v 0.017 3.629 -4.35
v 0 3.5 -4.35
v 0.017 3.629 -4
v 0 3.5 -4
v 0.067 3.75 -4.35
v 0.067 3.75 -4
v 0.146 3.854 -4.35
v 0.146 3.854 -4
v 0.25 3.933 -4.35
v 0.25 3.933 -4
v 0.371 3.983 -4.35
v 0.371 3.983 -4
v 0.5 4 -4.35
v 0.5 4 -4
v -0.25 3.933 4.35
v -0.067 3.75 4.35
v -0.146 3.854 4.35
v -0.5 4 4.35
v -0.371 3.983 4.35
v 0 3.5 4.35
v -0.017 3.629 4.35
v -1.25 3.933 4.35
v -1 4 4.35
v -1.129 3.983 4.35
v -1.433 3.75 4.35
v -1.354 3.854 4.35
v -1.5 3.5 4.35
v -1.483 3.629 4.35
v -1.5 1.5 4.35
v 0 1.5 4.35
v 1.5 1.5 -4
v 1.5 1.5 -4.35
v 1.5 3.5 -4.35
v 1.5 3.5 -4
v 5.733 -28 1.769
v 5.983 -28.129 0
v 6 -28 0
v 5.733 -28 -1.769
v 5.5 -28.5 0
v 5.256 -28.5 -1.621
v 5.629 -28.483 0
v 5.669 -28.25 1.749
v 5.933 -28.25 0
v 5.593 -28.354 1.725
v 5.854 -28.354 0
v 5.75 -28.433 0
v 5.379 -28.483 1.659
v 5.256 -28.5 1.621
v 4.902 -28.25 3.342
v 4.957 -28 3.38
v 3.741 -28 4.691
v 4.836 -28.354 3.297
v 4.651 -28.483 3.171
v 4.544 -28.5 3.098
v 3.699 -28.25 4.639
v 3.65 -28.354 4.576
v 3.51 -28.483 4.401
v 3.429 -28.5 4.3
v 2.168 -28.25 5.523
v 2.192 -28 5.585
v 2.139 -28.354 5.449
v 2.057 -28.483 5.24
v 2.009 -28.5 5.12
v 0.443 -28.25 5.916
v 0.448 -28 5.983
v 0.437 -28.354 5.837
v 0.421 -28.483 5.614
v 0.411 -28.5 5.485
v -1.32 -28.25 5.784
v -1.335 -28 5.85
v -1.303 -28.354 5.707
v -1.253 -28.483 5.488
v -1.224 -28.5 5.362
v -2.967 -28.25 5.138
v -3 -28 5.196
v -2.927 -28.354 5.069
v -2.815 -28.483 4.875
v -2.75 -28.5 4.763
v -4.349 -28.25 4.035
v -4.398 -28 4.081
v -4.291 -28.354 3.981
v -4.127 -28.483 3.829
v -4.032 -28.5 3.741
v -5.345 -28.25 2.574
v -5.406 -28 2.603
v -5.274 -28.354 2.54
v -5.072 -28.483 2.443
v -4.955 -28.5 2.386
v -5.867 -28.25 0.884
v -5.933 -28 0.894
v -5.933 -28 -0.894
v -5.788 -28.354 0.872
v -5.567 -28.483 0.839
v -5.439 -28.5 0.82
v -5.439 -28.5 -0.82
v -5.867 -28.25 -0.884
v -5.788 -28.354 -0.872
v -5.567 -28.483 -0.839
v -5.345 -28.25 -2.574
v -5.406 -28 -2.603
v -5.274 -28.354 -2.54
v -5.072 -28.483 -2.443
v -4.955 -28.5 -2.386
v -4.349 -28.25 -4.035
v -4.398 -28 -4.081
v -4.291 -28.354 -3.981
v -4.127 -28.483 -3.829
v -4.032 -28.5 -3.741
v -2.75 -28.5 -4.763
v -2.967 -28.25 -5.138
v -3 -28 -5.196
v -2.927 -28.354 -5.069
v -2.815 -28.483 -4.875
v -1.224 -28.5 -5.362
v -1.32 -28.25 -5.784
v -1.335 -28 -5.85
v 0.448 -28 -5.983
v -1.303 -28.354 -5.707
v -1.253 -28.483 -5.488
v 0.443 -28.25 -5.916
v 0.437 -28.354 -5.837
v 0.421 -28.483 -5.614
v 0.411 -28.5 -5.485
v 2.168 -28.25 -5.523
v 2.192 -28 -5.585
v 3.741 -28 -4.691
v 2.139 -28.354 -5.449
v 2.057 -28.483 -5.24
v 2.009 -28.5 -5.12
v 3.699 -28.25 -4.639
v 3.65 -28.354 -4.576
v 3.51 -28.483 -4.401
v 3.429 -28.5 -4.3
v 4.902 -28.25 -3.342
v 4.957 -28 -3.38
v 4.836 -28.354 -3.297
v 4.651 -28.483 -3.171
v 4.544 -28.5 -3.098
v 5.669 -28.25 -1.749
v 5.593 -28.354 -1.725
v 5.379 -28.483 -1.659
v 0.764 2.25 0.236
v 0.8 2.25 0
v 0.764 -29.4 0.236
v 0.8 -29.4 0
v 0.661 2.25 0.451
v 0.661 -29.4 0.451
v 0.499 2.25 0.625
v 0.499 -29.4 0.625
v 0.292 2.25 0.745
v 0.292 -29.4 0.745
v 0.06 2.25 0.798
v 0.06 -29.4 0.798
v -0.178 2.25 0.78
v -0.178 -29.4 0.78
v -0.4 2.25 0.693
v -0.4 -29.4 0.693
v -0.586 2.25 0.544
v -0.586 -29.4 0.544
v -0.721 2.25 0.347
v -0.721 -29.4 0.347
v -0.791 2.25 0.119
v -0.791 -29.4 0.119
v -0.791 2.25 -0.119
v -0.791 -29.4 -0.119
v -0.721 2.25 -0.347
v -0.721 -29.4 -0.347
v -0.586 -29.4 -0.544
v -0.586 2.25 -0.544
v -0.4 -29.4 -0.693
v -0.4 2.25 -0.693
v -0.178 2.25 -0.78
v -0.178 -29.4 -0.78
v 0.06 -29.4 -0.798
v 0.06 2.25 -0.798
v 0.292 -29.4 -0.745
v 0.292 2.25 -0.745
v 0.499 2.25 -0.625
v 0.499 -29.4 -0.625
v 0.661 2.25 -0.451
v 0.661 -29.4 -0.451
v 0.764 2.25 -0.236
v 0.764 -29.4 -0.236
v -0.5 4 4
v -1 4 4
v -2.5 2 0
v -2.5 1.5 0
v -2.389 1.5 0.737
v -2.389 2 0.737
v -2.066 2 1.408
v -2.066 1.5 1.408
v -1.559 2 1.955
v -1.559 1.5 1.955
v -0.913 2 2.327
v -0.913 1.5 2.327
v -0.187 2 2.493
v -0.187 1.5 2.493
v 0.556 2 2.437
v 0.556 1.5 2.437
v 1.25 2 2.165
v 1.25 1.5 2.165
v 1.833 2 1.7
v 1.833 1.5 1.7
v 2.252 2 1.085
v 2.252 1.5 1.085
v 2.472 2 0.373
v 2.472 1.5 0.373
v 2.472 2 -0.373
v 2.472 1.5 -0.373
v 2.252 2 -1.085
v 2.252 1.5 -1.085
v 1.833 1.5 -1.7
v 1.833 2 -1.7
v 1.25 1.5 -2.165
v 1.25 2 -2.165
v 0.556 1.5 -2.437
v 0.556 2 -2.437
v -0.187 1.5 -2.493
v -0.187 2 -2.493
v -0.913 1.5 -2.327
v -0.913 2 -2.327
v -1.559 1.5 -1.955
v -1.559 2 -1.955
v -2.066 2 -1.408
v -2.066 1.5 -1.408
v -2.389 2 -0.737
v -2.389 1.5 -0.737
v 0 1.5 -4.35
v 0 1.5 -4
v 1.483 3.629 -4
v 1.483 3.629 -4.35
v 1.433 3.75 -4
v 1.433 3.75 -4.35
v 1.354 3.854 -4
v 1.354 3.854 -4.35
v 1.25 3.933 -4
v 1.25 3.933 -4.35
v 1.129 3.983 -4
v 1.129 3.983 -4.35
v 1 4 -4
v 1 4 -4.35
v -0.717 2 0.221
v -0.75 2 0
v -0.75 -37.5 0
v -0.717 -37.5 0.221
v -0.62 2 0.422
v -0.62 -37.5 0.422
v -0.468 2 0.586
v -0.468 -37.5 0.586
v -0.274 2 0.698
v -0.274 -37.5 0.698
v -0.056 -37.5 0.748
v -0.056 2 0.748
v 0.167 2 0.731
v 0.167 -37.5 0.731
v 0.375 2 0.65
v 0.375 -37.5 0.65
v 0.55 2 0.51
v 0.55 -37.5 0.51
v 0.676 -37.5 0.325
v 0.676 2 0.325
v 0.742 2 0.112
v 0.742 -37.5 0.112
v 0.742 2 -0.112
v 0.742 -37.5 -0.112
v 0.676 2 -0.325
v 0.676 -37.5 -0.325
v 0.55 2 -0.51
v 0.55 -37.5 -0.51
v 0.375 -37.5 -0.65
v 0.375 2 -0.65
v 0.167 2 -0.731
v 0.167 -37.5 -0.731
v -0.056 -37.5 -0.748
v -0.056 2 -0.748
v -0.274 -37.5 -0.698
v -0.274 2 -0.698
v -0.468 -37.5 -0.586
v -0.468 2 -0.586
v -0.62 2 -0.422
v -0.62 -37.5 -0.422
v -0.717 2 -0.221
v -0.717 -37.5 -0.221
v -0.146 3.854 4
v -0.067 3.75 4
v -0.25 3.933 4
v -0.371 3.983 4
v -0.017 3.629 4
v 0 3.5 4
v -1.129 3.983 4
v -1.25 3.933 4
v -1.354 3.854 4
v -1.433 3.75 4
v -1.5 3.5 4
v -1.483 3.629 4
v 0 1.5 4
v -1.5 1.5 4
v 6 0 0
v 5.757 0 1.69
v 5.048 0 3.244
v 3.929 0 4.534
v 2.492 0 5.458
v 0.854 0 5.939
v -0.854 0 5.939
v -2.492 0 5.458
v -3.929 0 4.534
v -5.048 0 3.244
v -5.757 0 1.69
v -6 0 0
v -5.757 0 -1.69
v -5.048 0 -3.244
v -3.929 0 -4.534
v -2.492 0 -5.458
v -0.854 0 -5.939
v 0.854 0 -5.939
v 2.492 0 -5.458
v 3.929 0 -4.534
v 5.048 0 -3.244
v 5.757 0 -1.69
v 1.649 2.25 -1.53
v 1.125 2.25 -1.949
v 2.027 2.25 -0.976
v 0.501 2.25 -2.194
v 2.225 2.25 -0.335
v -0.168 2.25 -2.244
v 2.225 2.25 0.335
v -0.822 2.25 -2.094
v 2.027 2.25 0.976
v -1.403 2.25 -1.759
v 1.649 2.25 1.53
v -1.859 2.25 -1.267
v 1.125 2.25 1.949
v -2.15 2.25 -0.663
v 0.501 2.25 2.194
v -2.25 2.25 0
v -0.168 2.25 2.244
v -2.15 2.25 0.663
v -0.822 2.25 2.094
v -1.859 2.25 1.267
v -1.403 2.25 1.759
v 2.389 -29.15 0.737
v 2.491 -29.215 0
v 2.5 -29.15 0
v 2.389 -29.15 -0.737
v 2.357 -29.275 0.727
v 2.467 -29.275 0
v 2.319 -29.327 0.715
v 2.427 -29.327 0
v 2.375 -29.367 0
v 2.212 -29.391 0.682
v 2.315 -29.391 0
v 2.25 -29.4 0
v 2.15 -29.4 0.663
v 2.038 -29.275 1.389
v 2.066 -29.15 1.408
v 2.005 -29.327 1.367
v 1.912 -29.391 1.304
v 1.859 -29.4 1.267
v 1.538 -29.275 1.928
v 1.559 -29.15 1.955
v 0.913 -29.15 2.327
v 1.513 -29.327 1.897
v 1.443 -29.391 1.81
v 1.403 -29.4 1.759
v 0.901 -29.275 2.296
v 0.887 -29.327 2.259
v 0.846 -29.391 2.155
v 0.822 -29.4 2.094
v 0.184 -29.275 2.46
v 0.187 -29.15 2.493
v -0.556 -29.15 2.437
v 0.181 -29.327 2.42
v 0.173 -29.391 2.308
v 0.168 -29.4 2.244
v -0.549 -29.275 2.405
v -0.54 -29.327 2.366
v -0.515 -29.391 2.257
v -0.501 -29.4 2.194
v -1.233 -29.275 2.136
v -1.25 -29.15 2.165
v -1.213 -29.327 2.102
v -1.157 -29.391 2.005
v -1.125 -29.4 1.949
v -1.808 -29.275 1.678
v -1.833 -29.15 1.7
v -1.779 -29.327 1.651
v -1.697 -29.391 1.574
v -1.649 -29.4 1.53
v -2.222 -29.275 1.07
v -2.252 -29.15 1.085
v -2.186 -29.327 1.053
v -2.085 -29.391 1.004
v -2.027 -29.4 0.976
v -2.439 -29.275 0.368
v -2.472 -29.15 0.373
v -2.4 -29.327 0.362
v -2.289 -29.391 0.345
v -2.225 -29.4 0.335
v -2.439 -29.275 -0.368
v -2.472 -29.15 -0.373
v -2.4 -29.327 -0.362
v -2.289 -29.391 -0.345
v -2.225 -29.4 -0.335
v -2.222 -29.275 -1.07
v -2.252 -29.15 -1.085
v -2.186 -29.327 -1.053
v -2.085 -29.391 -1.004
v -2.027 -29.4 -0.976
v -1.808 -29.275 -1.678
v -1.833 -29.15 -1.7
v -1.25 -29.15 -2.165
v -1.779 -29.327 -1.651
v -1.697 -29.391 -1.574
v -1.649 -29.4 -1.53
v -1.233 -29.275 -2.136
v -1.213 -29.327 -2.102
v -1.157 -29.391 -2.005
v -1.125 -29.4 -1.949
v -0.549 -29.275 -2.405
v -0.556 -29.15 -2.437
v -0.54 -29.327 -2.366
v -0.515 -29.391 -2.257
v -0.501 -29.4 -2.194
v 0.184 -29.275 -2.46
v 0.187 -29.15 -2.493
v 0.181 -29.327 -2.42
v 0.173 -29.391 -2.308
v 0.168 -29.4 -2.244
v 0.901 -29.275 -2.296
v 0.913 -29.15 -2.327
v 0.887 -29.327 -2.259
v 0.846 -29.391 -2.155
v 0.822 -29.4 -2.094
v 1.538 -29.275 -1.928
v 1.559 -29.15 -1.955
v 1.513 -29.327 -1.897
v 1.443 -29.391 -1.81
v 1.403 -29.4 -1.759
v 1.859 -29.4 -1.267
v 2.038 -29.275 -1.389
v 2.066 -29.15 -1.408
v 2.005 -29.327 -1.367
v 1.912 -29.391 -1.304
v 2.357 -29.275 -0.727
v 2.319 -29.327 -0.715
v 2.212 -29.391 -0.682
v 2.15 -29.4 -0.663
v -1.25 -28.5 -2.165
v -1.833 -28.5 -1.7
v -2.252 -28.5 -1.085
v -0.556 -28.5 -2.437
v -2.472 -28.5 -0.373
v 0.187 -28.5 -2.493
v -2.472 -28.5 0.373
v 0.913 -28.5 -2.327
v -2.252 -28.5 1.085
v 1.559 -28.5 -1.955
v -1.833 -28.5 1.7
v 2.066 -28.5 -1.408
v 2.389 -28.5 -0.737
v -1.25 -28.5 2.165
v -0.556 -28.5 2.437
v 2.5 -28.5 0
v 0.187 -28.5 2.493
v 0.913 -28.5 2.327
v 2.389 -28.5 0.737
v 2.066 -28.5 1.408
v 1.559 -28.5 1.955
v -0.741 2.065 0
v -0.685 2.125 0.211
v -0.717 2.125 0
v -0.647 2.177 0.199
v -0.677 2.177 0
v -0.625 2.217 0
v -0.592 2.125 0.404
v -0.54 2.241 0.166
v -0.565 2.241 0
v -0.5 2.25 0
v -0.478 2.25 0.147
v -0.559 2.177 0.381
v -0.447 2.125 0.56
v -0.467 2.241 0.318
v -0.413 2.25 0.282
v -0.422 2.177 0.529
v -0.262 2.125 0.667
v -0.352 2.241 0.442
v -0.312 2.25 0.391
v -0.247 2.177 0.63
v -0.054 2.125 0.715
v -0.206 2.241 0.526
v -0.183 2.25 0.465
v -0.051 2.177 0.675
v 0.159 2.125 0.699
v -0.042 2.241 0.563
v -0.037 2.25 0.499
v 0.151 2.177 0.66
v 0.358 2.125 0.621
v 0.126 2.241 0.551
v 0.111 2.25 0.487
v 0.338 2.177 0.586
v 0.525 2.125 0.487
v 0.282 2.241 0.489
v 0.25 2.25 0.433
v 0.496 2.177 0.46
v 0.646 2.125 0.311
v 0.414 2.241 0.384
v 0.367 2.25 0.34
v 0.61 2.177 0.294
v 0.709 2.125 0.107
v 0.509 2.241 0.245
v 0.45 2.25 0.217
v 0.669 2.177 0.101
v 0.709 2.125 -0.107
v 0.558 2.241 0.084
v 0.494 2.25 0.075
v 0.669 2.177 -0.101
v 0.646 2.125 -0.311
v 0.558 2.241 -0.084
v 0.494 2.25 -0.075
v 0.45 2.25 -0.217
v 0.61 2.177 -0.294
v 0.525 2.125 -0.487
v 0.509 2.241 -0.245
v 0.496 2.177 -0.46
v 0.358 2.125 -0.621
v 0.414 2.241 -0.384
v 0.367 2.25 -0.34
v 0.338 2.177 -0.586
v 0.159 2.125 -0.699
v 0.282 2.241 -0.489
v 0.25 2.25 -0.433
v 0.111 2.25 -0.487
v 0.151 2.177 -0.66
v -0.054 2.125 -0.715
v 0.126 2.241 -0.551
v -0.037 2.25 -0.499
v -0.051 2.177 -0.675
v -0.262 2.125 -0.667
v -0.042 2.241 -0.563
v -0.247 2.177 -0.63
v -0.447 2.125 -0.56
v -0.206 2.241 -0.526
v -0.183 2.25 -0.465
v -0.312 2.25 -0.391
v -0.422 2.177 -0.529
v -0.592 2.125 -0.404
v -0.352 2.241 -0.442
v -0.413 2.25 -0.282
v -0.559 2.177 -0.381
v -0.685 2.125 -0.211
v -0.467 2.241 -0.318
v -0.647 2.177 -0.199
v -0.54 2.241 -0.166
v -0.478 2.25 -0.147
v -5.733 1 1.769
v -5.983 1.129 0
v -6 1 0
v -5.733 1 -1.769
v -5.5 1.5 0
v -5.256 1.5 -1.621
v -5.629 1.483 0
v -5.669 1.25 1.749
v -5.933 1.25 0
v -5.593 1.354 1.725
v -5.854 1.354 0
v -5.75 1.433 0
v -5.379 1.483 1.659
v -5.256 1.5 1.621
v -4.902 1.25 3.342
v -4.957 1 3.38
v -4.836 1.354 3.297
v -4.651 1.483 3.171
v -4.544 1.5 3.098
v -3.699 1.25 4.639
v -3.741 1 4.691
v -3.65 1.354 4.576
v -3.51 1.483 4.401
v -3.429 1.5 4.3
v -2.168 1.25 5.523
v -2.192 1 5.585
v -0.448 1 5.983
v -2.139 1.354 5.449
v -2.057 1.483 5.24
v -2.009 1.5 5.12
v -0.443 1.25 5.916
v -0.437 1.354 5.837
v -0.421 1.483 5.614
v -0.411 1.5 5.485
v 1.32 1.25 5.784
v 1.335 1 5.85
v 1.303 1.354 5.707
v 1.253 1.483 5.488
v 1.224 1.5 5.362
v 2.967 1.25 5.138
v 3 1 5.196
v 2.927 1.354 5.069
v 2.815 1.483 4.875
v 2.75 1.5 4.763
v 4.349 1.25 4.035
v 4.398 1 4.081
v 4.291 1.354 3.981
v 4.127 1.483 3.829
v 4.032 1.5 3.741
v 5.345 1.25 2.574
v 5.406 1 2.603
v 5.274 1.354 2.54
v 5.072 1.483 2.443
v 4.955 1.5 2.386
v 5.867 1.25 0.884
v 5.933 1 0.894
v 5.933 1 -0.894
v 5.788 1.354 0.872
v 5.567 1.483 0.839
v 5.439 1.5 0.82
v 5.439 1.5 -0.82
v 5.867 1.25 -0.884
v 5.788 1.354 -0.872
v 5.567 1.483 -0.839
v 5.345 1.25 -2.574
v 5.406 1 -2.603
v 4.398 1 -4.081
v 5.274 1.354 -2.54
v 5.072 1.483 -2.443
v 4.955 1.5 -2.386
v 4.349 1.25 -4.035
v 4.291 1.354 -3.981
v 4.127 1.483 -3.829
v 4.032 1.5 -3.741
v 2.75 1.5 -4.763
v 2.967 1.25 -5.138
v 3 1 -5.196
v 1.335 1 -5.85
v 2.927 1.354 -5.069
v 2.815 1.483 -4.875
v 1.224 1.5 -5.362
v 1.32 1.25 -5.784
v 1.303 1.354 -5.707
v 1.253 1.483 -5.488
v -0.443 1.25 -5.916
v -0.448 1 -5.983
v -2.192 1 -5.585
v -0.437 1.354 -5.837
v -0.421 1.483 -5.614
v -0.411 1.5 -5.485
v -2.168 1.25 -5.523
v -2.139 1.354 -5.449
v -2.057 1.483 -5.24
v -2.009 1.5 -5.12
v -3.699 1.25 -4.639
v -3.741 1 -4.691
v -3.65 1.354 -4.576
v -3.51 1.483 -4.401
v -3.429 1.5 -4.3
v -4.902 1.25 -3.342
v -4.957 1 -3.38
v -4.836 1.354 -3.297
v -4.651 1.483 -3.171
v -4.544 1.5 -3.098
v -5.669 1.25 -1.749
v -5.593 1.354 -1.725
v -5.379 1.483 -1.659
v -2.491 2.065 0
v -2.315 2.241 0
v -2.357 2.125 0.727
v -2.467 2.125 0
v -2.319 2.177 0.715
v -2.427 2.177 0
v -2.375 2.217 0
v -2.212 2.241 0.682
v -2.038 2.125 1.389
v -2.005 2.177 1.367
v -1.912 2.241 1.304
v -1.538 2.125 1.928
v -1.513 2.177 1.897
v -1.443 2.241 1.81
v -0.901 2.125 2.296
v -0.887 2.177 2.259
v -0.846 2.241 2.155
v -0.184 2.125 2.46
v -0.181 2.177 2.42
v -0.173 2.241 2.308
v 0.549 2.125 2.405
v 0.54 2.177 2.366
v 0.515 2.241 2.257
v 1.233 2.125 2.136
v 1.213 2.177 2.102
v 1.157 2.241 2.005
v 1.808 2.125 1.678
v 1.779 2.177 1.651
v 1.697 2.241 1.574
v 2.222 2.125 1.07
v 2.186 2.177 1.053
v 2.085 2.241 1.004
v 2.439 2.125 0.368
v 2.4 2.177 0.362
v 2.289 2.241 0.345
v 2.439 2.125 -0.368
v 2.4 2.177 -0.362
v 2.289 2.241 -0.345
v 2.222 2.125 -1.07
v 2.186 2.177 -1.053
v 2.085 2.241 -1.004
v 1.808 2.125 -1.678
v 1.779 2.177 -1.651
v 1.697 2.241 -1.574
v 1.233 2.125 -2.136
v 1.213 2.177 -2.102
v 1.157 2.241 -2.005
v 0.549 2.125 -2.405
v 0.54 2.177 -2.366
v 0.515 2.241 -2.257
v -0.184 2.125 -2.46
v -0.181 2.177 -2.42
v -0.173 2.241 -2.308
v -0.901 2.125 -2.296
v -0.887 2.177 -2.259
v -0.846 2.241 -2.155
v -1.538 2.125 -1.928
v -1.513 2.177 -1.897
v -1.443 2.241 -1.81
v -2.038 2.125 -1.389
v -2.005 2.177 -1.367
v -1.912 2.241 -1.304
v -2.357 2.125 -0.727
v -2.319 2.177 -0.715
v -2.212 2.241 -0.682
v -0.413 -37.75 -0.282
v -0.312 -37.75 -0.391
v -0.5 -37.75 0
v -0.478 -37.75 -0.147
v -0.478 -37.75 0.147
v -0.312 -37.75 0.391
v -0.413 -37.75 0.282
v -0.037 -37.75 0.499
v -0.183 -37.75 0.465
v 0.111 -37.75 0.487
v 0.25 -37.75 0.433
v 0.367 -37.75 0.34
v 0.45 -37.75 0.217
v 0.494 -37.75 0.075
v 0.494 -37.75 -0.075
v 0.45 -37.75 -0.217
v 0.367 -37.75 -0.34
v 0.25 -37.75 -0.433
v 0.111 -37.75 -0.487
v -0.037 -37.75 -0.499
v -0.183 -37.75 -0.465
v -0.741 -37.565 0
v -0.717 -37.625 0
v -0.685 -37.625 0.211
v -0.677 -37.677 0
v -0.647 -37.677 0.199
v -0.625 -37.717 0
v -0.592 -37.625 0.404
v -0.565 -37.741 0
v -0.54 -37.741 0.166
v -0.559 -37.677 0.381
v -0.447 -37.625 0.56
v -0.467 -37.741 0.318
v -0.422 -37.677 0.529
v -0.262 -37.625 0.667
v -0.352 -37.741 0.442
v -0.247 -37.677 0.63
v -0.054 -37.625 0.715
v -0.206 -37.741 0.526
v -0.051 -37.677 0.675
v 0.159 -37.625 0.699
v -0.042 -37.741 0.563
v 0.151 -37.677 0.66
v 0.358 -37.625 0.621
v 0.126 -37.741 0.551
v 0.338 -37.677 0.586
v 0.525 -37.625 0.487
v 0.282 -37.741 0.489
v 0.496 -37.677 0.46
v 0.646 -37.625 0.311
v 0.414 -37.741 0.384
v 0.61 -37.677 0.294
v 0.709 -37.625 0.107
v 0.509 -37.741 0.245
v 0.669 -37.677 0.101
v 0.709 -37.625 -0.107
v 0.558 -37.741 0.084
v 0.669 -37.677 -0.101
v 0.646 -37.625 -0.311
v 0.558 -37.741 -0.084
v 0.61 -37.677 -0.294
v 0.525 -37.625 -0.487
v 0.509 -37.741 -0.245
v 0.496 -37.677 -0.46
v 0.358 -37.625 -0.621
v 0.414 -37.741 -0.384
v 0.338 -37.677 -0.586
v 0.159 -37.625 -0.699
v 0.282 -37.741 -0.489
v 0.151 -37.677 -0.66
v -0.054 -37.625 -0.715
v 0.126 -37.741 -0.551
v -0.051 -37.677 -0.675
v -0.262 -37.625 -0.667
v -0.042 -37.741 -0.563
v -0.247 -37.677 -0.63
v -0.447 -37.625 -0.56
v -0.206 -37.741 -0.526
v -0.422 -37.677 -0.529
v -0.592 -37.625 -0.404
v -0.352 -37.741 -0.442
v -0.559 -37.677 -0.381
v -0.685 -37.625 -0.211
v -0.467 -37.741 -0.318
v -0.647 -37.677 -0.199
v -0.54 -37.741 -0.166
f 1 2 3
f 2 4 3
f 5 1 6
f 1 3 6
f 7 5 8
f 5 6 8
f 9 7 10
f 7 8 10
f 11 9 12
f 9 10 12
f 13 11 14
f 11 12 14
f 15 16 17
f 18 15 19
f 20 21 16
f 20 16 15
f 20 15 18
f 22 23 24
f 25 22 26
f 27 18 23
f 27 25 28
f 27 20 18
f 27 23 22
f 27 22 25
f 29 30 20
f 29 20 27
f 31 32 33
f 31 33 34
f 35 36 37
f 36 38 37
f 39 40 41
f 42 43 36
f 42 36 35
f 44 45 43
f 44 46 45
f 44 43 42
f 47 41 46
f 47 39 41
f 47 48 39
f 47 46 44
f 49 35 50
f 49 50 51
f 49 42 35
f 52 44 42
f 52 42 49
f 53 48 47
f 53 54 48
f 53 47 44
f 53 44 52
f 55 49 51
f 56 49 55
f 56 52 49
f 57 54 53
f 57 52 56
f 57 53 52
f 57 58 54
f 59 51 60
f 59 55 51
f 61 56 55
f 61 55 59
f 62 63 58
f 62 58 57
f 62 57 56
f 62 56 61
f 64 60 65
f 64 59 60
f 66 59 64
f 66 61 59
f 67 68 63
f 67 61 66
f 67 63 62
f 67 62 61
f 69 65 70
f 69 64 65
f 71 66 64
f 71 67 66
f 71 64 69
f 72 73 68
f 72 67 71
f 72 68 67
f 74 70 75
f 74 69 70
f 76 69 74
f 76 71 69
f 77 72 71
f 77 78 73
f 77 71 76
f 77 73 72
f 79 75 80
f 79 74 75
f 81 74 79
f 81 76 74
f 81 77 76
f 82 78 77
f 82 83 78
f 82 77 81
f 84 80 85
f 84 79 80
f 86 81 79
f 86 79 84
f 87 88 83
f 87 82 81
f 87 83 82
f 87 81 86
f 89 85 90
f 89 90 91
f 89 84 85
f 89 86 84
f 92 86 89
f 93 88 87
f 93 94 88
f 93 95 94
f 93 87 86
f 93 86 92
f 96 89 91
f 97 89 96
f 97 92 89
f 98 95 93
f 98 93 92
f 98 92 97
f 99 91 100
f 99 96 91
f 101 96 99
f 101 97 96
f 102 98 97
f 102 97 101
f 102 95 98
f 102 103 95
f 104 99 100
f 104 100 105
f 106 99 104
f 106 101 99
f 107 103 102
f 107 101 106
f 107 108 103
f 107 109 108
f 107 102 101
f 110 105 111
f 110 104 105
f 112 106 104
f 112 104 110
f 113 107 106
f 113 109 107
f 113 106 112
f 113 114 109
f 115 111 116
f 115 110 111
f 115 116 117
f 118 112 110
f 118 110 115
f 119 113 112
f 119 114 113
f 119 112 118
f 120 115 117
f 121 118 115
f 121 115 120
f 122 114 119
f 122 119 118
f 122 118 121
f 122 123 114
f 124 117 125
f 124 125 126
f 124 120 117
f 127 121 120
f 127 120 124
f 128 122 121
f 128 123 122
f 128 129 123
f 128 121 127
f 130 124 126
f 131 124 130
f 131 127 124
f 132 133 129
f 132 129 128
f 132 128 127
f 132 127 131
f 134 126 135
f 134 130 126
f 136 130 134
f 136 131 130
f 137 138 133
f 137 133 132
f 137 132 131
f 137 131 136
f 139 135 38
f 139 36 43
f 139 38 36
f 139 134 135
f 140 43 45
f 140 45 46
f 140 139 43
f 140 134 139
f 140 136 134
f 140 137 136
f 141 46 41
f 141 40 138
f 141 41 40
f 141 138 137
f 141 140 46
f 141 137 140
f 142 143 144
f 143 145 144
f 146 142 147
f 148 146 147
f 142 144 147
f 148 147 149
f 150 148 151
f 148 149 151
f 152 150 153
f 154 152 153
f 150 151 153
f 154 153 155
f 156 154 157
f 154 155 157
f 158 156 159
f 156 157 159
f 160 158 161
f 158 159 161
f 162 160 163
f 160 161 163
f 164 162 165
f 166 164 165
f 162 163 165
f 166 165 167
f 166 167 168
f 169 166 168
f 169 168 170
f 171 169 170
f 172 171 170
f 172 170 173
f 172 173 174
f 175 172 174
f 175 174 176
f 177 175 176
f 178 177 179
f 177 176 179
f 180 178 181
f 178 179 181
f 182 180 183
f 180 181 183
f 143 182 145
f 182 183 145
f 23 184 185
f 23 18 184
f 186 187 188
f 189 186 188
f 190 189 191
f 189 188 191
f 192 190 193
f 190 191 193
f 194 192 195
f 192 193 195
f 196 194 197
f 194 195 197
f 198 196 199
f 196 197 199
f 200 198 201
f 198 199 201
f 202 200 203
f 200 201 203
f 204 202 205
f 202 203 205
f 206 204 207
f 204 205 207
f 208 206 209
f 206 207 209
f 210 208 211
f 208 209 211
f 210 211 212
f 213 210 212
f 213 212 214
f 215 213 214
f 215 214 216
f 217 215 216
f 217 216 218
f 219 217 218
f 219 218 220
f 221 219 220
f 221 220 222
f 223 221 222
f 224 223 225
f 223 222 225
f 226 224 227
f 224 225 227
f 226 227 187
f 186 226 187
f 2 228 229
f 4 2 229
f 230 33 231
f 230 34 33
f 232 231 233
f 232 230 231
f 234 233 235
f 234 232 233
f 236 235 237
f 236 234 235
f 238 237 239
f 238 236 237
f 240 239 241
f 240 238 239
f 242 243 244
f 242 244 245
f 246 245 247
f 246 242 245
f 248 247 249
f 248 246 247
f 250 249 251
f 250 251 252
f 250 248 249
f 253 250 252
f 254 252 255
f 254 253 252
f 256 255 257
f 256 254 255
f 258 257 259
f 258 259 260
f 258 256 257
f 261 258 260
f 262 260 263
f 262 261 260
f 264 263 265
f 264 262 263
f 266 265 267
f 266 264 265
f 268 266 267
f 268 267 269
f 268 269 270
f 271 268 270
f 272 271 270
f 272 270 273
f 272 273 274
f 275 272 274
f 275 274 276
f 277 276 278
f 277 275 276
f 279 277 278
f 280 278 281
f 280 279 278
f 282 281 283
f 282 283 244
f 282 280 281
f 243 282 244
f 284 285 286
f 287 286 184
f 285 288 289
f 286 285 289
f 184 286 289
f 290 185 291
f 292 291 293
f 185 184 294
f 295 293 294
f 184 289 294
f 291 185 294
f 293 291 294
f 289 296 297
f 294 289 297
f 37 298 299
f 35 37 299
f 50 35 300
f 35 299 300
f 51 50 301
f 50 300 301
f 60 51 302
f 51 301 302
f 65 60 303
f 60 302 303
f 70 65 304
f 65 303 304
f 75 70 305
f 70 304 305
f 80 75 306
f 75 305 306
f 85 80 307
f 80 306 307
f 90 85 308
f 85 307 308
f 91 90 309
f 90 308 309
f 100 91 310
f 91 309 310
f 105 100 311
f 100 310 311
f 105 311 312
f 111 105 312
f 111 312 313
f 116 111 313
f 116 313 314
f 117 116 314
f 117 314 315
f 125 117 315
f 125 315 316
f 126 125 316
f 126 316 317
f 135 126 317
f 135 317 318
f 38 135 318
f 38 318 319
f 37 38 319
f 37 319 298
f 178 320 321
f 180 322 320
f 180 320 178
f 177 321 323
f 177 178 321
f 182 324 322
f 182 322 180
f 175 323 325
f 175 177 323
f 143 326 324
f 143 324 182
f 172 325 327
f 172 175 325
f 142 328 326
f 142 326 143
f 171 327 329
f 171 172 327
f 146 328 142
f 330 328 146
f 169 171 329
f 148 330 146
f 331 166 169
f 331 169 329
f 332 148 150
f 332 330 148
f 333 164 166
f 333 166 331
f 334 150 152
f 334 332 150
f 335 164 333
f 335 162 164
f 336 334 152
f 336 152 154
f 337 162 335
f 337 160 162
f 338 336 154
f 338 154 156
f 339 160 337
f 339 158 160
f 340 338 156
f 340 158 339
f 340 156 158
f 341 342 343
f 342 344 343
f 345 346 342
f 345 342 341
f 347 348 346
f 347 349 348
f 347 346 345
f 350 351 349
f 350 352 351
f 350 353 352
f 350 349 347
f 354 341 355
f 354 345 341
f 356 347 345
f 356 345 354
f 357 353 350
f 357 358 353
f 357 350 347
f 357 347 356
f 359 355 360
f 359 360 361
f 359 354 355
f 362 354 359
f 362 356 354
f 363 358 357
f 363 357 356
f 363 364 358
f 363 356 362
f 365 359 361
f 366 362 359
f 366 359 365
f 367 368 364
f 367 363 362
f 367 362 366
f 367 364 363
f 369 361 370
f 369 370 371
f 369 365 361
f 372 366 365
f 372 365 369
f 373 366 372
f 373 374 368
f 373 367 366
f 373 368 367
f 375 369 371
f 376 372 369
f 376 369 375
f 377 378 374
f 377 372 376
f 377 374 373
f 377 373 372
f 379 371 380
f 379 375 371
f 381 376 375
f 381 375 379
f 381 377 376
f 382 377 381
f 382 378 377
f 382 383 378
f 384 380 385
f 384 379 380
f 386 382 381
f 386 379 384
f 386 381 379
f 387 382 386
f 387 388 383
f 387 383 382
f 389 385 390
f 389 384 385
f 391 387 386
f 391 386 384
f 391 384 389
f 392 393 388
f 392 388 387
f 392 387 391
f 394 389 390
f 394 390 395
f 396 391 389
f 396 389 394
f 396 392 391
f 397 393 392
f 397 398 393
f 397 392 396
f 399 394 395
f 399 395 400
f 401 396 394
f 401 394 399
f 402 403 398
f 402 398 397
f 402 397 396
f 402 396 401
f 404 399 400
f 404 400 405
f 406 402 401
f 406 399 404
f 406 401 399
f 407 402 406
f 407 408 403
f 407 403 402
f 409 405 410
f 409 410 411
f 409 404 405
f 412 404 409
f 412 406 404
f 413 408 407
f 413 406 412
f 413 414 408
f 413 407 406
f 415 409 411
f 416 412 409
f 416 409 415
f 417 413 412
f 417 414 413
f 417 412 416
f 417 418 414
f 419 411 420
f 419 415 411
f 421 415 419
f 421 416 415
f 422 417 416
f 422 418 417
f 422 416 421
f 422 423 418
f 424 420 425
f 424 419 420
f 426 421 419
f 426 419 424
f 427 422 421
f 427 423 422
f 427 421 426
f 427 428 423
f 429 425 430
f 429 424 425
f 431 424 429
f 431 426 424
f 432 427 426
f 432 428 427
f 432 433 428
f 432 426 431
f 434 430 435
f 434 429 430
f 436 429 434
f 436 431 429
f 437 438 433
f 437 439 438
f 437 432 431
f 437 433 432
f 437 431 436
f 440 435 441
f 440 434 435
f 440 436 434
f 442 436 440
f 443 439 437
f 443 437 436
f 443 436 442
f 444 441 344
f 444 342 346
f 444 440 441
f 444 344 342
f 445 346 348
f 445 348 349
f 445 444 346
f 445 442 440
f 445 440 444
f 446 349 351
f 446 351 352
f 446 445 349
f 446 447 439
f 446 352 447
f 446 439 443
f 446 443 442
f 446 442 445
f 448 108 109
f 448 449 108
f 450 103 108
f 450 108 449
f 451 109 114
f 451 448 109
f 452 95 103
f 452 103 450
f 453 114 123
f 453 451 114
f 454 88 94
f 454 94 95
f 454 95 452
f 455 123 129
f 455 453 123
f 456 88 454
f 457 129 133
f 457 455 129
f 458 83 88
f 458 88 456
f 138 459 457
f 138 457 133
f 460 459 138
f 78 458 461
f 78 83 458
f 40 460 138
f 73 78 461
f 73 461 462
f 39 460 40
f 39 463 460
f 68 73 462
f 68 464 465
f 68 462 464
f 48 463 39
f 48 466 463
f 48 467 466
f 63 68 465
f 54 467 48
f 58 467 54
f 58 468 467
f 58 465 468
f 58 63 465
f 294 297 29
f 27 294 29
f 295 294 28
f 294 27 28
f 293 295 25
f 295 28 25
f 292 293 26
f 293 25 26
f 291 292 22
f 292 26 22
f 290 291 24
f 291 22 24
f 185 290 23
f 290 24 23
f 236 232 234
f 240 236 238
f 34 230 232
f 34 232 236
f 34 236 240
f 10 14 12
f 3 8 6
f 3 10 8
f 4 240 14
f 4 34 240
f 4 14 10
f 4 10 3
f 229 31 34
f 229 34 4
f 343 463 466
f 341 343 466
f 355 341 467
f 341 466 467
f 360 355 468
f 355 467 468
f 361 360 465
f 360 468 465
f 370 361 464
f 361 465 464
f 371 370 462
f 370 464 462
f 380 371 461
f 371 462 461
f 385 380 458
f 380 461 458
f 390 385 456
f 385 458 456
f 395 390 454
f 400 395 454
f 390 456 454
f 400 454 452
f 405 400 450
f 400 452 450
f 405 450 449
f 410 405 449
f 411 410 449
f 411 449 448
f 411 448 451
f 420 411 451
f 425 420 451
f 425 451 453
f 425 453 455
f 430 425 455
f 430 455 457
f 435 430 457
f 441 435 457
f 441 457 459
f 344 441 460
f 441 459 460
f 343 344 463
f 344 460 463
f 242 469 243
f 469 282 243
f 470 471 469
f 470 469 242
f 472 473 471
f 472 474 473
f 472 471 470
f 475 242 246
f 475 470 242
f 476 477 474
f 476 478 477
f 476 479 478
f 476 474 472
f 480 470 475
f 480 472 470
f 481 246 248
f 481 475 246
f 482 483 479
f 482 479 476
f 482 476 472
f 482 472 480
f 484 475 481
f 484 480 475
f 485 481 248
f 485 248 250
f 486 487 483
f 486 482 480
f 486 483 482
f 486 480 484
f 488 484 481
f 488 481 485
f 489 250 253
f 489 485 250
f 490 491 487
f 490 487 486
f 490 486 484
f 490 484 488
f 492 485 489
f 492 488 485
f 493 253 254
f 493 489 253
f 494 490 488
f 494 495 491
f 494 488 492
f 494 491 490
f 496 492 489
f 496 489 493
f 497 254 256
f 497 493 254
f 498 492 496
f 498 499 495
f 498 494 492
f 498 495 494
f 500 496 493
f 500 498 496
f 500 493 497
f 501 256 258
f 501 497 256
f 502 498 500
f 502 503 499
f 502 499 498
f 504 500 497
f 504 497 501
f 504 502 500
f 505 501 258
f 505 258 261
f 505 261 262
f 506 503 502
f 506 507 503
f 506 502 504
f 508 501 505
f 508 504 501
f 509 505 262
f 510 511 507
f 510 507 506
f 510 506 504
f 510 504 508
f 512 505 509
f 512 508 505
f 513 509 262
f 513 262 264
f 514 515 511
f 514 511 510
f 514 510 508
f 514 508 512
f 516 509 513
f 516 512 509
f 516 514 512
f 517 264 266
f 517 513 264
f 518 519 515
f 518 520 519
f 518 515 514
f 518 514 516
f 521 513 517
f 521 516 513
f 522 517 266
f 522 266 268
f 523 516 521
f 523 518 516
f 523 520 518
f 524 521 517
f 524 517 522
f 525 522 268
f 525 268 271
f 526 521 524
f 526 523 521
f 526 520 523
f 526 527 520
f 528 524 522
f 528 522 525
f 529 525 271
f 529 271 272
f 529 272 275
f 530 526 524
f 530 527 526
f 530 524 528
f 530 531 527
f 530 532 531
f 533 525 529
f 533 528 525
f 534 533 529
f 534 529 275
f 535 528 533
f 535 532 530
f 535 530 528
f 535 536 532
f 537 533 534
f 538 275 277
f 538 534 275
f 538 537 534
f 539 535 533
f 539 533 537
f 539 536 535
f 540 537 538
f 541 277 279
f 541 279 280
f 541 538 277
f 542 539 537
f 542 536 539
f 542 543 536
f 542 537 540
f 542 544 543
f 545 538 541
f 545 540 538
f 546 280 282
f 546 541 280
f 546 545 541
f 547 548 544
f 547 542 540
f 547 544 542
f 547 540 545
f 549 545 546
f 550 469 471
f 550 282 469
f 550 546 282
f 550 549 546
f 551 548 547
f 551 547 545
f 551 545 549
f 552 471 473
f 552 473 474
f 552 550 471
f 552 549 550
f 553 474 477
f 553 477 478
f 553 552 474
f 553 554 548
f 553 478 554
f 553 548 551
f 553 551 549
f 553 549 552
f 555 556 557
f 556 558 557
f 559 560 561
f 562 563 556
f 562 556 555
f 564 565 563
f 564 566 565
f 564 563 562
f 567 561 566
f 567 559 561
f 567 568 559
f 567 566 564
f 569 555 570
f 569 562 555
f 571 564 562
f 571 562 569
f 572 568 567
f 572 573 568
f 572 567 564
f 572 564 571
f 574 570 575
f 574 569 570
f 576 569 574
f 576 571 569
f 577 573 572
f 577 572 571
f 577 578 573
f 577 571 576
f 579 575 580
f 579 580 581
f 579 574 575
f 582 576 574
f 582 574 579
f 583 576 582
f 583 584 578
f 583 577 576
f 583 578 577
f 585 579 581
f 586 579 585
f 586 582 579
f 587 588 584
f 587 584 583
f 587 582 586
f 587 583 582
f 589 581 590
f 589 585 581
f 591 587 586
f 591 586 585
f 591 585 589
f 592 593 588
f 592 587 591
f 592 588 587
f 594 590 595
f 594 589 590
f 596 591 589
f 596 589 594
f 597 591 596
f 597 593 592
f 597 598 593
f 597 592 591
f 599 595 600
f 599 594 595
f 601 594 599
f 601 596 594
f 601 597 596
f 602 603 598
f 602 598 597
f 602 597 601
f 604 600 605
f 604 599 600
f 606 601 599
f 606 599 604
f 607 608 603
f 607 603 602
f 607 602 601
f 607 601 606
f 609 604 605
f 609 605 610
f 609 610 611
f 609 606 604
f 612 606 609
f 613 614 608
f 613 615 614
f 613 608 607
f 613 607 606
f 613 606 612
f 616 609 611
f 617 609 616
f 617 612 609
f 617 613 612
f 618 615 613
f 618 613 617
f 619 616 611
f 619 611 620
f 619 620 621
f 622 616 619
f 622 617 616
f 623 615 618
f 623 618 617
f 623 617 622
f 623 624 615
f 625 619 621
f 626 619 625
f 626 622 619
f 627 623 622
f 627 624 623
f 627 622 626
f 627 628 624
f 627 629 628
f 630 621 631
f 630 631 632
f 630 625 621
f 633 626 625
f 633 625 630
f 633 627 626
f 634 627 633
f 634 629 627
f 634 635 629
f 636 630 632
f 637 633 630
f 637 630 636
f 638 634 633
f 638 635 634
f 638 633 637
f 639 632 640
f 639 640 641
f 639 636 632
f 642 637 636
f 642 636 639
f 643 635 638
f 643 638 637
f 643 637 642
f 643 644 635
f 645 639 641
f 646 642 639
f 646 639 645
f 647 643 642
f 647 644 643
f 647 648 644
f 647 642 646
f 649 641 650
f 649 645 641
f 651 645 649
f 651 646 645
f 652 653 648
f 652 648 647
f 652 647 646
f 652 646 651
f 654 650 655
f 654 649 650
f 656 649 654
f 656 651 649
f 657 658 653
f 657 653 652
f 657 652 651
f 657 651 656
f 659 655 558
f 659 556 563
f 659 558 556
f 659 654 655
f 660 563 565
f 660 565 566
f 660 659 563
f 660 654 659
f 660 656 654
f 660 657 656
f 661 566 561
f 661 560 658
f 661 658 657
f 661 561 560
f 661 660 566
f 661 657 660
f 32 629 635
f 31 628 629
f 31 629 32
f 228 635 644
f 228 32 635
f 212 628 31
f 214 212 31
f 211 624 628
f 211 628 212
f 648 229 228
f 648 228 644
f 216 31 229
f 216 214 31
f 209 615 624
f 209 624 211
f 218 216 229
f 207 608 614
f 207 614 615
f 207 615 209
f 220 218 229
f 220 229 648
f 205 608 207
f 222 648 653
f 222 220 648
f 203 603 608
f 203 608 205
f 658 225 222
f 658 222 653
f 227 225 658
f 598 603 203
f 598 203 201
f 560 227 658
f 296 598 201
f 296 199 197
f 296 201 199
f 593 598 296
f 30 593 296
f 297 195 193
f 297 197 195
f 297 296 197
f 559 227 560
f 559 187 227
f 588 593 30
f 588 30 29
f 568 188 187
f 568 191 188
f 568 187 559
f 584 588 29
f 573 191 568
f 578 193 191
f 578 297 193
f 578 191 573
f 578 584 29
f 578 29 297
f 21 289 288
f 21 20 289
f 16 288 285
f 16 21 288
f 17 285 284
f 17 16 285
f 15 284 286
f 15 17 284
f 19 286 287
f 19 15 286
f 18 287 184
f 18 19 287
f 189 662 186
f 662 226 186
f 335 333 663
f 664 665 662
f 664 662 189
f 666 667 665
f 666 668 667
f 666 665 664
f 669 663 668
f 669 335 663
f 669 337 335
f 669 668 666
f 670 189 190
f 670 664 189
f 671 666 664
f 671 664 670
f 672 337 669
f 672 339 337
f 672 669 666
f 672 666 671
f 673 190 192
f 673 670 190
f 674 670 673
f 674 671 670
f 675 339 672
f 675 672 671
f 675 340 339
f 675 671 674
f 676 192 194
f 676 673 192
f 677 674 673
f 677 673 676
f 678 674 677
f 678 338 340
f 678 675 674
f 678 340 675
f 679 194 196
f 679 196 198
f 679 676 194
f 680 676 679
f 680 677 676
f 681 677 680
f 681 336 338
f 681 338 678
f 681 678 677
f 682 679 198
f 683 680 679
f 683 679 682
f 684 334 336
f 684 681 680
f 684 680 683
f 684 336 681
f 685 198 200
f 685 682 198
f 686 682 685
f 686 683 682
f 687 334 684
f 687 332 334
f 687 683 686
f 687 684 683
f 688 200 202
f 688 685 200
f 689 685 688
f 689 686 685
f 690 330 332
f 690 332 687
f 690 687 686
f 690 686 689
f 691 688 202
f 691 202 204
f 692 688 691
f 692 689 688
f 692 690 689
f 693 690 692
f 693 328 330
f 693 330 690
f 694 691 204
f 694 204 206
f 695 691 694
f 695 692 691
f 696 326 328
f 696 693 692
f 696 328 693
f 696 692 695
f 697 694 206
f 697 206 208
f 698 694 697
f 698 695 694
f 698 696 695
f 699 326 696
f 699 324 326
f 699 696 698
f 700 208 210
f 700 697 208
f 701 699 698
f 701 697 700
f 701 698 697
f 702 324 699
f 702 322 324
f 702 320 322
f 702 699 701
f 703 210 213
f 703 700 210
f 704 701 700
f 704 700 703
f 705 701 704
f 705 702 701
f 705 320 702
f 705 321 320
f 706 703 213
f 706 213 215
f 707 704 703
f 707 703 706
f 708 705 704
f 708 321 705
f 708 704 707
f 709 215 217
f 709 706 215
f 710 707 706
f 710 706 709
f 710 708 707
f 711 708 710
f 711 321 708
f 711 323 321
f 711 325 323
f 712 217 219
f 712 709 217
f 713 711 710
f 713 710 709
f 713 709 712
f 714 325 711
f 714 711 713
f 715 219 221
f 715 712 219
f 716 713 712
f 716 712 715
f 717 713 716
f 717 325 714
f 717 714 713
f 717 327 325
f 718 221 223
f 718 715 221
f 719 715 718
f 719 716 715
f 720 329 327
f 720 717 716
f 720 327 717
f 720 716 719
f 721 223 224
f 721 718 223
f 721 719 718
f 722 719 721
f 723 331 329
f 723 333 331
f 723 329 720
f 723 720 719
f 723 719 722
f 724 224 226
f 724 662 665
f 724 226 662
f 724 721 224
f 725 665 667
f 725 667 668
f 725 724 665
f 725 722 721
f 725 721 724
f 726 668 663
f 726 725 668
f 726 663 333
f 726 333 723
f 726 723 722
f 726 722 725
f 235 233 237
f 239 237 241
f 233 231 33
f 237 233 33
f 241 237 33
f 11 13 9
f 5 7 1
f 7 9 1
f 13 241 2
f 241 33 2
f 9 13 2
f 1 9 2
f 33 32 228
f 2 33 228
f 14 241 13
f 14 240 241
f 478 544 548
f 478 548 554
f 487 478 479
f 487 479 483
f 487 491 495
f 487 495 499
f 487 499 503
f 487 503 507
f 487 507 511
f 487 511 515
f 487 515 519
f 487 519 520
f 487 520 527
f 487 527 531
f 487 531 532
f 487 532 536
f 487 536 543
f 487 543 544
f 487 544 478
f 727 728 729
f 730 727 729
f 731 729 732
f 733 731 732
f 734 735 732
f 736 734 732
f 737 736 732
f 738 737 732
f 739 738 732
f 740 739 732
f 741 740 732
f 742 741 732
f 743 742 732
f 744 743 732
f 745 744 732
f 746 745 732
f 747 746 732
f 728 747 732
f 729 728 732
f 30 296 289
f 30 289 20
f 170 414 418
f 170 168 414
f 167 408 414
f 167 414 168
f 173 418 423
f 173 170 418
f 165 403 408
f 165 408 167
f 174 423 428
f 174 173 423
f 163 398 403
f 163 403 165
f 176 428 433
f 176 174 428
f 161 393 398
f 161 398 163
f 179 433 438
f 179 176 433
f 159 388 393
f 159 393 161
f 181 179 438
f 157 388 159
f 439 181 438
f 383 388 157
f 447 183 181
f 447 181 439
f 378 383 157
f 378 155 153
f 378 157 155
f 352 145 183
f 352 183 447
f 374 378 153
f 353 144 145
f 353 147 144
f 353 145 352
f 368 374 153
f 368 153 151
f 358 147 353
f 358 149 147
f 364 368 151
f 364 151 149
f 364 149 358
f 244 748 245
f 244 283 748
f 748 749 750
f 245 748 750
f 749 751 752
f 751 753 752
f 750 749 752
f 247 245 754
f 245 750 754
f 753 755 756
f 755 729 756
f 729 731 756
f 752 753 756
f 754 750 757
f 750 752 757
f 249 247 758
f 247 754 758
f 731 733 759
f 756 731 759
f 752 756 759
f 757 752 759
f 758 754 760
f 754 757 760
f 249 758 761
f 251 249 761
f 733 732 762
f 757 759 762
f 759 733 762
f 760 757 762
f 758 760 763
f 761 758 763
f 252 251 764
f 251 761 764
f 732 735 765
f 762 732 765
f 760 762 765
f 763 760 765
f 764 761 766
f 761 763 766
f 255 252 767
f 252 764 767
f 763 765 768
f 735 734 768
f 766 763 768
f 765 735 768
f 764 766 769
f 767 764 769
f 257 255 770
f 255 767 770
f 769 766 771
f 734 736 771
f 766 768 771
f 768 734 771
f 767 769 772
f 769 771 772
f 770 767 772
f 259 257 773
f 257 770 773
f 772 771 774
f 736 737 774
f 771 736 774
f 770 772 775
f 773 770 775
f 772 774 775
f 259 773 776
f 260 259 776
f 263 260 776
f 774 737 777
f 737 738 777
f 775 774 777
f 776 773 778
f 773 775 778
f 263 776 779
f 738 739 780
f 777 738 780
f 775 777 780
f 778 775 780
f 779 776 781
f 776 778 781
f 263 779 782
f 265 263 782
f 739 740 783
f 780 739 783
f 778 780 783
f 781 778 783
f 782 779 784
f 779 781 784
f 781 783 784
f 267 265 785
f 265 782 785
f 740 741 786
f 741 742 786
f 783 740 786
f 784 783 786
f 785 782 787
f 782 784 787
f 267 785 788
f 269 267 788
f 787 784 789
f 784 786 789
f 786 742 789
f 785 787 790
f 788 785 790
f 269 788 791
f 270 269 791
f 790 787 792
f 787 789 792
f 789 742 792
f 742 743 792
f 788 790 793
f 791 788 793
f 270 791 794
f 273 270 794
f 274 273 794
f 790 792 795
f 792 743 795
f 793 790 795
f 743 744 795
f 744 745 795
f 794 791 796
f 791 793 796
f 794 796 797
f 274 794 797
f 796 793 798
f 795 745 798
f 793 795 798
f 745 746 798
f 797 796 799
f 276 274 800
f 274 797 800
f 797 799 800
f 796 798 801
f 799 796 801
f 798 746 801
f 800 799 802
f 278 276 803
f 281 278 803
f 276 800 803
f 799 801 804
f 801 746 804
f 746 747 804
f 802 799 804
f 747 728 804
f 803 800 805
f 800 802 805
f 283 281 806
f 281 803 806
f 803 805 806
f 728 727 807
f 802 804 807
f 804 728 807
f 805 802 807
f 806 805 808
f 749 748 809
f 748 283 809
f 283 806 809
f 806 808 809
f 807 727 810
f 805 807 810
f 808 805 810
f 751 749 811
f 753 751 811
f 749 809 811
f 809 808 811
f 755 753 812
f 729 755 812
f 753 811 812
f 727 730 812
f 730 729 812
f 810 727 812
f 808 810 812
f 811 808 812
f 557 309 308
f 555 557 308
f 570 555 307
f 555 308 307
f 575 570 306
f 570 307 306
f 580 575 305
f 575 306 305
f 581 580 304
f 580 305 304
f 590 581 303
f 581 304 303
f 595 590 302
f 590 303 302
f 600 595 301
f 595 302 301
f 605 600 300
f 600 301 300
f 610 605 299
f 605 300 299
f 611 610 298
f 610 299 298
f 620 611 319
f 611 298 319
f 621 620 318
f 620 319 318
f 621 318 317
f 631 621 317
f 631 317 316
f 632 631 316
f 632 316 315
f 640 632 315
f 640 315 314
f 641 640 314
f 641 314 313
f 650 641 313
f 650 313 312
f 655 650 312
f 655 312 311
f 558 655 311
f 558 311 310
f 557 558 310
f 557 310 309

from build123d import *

# Parameters (mm, degrees)
F0_R      = 6
F1_DEPTH  = 28.5
F2_R      = 2.5
F3_DEPTH  = 0.9
F4_R      = 6
F4_R_2    = 2.5
F5_DEPTH  = 1.5
F6_R      = 2.5
F7_DEPTH  = 0.75
F8_R      = 0.8
F9_DEPTH  = 30
F10_R     = 0.75
F11_DEPTH = 40
F12_W     = 1.5
F12_H     = 0.35
F13_DEPTH = 2.5
F14_R     = 0.5
F15_R     = 0.25
F15_2_R   = 0.25


with BuildPart() as f1:
    # F0 (on Front) → F1 (new body)
    with BuildSketch(Plane.XZ):
        Circle(F0_R)
    extrude(amount=F1_DEPTH)

    # F2 (on face) → F3 (join)
    with BuildSketch(Plane.XZ.offset(28.5)):
        Circle(F2_R)
    extrude(amount=F3_DEPTH)

    # F4 (on face) → F5 (join)
    with BuildSketch(Plane(origin=(0, 0, 0), x_dir=(-1, 0, 0), z_dir=(0, 1, 0))):
        Circle(F4_R)
        Circle(F4_R_2, mode=Mode.SUBTRACT)
        Circle(F4_R_2)
    extrude(amount=F5_DEPTH)

    # F6 (on face) → F7 (join)
    with BuildSketch(Plane(origin=(0, 1.5, 0), x_dir=(-1, 0, 0), z_dir=(0, 1, 0))):
        Circle(F6_R)
    extrude(amount=F7_DEPTH)

    # F8 (on Front) → F9 (cut, symmetric)
    with BuildSketch(Plane.XZ):
        Circle(F8_R)
    extrude(amount=F9_DEPTH, both=True, mode=Mode.SUBTRACT)

    # F12 (on face) → F13 (join)
    with BuildSketch(Plane(origin=(0, 1.5, 0), x_dir=(-1, 0, 0), z_dir=(0, 1, 0))):
        with Locations((-0.75, -4.175)):
            Rectangle(F12_W, F12_H)
        with Locations((0.75, 4.175)):
            Rectangle(F12_W, F12_H)
    extrude(amount=F13_DEPTH)

    # F14
    f14_edges = [f1.edges().sort_by_distance(p)[0] for p in [
        (6, 1.5, 0),
        (-1.5, 4, 4.175),
        (0, 4, 4.175),
        (0, 4, -4.175),
        (1.5, 4, -4.175),
        (-6, -28.5, 0),
    ]]
    fillet(f14_edges, radius=F14_R)

    # F15
    f15_edges = [f1.edges().sort_by_distance(p)[0] for p in [
        (-2.5, -29.4, 0),
        (2.5, 2.25, 0),
    ]]
    fillet(f15_edges, radius=F15_R)


with BuildPart() as f11:
    # F10 (on face) → F11 (new body)
    with BuildSketch(Plane(origin=(0, 2.25, 0), x_dir=(-1, 0, 0), z_dir=(0, 1, 0))):
        Circle(F10_R)
    extrude(amount=-F11_DEPTH)

    # F15#2
    f15_2_edges = [f11.edges().sort_by_distance(p)[0] for p in [
        (0.75, 2.25, 0),
        (0.75, -37.75, 0),
    ]]
    fillet(f15_2_edges, radius=F15_2_R)


solid = Compound([f1.part, f11.part])
